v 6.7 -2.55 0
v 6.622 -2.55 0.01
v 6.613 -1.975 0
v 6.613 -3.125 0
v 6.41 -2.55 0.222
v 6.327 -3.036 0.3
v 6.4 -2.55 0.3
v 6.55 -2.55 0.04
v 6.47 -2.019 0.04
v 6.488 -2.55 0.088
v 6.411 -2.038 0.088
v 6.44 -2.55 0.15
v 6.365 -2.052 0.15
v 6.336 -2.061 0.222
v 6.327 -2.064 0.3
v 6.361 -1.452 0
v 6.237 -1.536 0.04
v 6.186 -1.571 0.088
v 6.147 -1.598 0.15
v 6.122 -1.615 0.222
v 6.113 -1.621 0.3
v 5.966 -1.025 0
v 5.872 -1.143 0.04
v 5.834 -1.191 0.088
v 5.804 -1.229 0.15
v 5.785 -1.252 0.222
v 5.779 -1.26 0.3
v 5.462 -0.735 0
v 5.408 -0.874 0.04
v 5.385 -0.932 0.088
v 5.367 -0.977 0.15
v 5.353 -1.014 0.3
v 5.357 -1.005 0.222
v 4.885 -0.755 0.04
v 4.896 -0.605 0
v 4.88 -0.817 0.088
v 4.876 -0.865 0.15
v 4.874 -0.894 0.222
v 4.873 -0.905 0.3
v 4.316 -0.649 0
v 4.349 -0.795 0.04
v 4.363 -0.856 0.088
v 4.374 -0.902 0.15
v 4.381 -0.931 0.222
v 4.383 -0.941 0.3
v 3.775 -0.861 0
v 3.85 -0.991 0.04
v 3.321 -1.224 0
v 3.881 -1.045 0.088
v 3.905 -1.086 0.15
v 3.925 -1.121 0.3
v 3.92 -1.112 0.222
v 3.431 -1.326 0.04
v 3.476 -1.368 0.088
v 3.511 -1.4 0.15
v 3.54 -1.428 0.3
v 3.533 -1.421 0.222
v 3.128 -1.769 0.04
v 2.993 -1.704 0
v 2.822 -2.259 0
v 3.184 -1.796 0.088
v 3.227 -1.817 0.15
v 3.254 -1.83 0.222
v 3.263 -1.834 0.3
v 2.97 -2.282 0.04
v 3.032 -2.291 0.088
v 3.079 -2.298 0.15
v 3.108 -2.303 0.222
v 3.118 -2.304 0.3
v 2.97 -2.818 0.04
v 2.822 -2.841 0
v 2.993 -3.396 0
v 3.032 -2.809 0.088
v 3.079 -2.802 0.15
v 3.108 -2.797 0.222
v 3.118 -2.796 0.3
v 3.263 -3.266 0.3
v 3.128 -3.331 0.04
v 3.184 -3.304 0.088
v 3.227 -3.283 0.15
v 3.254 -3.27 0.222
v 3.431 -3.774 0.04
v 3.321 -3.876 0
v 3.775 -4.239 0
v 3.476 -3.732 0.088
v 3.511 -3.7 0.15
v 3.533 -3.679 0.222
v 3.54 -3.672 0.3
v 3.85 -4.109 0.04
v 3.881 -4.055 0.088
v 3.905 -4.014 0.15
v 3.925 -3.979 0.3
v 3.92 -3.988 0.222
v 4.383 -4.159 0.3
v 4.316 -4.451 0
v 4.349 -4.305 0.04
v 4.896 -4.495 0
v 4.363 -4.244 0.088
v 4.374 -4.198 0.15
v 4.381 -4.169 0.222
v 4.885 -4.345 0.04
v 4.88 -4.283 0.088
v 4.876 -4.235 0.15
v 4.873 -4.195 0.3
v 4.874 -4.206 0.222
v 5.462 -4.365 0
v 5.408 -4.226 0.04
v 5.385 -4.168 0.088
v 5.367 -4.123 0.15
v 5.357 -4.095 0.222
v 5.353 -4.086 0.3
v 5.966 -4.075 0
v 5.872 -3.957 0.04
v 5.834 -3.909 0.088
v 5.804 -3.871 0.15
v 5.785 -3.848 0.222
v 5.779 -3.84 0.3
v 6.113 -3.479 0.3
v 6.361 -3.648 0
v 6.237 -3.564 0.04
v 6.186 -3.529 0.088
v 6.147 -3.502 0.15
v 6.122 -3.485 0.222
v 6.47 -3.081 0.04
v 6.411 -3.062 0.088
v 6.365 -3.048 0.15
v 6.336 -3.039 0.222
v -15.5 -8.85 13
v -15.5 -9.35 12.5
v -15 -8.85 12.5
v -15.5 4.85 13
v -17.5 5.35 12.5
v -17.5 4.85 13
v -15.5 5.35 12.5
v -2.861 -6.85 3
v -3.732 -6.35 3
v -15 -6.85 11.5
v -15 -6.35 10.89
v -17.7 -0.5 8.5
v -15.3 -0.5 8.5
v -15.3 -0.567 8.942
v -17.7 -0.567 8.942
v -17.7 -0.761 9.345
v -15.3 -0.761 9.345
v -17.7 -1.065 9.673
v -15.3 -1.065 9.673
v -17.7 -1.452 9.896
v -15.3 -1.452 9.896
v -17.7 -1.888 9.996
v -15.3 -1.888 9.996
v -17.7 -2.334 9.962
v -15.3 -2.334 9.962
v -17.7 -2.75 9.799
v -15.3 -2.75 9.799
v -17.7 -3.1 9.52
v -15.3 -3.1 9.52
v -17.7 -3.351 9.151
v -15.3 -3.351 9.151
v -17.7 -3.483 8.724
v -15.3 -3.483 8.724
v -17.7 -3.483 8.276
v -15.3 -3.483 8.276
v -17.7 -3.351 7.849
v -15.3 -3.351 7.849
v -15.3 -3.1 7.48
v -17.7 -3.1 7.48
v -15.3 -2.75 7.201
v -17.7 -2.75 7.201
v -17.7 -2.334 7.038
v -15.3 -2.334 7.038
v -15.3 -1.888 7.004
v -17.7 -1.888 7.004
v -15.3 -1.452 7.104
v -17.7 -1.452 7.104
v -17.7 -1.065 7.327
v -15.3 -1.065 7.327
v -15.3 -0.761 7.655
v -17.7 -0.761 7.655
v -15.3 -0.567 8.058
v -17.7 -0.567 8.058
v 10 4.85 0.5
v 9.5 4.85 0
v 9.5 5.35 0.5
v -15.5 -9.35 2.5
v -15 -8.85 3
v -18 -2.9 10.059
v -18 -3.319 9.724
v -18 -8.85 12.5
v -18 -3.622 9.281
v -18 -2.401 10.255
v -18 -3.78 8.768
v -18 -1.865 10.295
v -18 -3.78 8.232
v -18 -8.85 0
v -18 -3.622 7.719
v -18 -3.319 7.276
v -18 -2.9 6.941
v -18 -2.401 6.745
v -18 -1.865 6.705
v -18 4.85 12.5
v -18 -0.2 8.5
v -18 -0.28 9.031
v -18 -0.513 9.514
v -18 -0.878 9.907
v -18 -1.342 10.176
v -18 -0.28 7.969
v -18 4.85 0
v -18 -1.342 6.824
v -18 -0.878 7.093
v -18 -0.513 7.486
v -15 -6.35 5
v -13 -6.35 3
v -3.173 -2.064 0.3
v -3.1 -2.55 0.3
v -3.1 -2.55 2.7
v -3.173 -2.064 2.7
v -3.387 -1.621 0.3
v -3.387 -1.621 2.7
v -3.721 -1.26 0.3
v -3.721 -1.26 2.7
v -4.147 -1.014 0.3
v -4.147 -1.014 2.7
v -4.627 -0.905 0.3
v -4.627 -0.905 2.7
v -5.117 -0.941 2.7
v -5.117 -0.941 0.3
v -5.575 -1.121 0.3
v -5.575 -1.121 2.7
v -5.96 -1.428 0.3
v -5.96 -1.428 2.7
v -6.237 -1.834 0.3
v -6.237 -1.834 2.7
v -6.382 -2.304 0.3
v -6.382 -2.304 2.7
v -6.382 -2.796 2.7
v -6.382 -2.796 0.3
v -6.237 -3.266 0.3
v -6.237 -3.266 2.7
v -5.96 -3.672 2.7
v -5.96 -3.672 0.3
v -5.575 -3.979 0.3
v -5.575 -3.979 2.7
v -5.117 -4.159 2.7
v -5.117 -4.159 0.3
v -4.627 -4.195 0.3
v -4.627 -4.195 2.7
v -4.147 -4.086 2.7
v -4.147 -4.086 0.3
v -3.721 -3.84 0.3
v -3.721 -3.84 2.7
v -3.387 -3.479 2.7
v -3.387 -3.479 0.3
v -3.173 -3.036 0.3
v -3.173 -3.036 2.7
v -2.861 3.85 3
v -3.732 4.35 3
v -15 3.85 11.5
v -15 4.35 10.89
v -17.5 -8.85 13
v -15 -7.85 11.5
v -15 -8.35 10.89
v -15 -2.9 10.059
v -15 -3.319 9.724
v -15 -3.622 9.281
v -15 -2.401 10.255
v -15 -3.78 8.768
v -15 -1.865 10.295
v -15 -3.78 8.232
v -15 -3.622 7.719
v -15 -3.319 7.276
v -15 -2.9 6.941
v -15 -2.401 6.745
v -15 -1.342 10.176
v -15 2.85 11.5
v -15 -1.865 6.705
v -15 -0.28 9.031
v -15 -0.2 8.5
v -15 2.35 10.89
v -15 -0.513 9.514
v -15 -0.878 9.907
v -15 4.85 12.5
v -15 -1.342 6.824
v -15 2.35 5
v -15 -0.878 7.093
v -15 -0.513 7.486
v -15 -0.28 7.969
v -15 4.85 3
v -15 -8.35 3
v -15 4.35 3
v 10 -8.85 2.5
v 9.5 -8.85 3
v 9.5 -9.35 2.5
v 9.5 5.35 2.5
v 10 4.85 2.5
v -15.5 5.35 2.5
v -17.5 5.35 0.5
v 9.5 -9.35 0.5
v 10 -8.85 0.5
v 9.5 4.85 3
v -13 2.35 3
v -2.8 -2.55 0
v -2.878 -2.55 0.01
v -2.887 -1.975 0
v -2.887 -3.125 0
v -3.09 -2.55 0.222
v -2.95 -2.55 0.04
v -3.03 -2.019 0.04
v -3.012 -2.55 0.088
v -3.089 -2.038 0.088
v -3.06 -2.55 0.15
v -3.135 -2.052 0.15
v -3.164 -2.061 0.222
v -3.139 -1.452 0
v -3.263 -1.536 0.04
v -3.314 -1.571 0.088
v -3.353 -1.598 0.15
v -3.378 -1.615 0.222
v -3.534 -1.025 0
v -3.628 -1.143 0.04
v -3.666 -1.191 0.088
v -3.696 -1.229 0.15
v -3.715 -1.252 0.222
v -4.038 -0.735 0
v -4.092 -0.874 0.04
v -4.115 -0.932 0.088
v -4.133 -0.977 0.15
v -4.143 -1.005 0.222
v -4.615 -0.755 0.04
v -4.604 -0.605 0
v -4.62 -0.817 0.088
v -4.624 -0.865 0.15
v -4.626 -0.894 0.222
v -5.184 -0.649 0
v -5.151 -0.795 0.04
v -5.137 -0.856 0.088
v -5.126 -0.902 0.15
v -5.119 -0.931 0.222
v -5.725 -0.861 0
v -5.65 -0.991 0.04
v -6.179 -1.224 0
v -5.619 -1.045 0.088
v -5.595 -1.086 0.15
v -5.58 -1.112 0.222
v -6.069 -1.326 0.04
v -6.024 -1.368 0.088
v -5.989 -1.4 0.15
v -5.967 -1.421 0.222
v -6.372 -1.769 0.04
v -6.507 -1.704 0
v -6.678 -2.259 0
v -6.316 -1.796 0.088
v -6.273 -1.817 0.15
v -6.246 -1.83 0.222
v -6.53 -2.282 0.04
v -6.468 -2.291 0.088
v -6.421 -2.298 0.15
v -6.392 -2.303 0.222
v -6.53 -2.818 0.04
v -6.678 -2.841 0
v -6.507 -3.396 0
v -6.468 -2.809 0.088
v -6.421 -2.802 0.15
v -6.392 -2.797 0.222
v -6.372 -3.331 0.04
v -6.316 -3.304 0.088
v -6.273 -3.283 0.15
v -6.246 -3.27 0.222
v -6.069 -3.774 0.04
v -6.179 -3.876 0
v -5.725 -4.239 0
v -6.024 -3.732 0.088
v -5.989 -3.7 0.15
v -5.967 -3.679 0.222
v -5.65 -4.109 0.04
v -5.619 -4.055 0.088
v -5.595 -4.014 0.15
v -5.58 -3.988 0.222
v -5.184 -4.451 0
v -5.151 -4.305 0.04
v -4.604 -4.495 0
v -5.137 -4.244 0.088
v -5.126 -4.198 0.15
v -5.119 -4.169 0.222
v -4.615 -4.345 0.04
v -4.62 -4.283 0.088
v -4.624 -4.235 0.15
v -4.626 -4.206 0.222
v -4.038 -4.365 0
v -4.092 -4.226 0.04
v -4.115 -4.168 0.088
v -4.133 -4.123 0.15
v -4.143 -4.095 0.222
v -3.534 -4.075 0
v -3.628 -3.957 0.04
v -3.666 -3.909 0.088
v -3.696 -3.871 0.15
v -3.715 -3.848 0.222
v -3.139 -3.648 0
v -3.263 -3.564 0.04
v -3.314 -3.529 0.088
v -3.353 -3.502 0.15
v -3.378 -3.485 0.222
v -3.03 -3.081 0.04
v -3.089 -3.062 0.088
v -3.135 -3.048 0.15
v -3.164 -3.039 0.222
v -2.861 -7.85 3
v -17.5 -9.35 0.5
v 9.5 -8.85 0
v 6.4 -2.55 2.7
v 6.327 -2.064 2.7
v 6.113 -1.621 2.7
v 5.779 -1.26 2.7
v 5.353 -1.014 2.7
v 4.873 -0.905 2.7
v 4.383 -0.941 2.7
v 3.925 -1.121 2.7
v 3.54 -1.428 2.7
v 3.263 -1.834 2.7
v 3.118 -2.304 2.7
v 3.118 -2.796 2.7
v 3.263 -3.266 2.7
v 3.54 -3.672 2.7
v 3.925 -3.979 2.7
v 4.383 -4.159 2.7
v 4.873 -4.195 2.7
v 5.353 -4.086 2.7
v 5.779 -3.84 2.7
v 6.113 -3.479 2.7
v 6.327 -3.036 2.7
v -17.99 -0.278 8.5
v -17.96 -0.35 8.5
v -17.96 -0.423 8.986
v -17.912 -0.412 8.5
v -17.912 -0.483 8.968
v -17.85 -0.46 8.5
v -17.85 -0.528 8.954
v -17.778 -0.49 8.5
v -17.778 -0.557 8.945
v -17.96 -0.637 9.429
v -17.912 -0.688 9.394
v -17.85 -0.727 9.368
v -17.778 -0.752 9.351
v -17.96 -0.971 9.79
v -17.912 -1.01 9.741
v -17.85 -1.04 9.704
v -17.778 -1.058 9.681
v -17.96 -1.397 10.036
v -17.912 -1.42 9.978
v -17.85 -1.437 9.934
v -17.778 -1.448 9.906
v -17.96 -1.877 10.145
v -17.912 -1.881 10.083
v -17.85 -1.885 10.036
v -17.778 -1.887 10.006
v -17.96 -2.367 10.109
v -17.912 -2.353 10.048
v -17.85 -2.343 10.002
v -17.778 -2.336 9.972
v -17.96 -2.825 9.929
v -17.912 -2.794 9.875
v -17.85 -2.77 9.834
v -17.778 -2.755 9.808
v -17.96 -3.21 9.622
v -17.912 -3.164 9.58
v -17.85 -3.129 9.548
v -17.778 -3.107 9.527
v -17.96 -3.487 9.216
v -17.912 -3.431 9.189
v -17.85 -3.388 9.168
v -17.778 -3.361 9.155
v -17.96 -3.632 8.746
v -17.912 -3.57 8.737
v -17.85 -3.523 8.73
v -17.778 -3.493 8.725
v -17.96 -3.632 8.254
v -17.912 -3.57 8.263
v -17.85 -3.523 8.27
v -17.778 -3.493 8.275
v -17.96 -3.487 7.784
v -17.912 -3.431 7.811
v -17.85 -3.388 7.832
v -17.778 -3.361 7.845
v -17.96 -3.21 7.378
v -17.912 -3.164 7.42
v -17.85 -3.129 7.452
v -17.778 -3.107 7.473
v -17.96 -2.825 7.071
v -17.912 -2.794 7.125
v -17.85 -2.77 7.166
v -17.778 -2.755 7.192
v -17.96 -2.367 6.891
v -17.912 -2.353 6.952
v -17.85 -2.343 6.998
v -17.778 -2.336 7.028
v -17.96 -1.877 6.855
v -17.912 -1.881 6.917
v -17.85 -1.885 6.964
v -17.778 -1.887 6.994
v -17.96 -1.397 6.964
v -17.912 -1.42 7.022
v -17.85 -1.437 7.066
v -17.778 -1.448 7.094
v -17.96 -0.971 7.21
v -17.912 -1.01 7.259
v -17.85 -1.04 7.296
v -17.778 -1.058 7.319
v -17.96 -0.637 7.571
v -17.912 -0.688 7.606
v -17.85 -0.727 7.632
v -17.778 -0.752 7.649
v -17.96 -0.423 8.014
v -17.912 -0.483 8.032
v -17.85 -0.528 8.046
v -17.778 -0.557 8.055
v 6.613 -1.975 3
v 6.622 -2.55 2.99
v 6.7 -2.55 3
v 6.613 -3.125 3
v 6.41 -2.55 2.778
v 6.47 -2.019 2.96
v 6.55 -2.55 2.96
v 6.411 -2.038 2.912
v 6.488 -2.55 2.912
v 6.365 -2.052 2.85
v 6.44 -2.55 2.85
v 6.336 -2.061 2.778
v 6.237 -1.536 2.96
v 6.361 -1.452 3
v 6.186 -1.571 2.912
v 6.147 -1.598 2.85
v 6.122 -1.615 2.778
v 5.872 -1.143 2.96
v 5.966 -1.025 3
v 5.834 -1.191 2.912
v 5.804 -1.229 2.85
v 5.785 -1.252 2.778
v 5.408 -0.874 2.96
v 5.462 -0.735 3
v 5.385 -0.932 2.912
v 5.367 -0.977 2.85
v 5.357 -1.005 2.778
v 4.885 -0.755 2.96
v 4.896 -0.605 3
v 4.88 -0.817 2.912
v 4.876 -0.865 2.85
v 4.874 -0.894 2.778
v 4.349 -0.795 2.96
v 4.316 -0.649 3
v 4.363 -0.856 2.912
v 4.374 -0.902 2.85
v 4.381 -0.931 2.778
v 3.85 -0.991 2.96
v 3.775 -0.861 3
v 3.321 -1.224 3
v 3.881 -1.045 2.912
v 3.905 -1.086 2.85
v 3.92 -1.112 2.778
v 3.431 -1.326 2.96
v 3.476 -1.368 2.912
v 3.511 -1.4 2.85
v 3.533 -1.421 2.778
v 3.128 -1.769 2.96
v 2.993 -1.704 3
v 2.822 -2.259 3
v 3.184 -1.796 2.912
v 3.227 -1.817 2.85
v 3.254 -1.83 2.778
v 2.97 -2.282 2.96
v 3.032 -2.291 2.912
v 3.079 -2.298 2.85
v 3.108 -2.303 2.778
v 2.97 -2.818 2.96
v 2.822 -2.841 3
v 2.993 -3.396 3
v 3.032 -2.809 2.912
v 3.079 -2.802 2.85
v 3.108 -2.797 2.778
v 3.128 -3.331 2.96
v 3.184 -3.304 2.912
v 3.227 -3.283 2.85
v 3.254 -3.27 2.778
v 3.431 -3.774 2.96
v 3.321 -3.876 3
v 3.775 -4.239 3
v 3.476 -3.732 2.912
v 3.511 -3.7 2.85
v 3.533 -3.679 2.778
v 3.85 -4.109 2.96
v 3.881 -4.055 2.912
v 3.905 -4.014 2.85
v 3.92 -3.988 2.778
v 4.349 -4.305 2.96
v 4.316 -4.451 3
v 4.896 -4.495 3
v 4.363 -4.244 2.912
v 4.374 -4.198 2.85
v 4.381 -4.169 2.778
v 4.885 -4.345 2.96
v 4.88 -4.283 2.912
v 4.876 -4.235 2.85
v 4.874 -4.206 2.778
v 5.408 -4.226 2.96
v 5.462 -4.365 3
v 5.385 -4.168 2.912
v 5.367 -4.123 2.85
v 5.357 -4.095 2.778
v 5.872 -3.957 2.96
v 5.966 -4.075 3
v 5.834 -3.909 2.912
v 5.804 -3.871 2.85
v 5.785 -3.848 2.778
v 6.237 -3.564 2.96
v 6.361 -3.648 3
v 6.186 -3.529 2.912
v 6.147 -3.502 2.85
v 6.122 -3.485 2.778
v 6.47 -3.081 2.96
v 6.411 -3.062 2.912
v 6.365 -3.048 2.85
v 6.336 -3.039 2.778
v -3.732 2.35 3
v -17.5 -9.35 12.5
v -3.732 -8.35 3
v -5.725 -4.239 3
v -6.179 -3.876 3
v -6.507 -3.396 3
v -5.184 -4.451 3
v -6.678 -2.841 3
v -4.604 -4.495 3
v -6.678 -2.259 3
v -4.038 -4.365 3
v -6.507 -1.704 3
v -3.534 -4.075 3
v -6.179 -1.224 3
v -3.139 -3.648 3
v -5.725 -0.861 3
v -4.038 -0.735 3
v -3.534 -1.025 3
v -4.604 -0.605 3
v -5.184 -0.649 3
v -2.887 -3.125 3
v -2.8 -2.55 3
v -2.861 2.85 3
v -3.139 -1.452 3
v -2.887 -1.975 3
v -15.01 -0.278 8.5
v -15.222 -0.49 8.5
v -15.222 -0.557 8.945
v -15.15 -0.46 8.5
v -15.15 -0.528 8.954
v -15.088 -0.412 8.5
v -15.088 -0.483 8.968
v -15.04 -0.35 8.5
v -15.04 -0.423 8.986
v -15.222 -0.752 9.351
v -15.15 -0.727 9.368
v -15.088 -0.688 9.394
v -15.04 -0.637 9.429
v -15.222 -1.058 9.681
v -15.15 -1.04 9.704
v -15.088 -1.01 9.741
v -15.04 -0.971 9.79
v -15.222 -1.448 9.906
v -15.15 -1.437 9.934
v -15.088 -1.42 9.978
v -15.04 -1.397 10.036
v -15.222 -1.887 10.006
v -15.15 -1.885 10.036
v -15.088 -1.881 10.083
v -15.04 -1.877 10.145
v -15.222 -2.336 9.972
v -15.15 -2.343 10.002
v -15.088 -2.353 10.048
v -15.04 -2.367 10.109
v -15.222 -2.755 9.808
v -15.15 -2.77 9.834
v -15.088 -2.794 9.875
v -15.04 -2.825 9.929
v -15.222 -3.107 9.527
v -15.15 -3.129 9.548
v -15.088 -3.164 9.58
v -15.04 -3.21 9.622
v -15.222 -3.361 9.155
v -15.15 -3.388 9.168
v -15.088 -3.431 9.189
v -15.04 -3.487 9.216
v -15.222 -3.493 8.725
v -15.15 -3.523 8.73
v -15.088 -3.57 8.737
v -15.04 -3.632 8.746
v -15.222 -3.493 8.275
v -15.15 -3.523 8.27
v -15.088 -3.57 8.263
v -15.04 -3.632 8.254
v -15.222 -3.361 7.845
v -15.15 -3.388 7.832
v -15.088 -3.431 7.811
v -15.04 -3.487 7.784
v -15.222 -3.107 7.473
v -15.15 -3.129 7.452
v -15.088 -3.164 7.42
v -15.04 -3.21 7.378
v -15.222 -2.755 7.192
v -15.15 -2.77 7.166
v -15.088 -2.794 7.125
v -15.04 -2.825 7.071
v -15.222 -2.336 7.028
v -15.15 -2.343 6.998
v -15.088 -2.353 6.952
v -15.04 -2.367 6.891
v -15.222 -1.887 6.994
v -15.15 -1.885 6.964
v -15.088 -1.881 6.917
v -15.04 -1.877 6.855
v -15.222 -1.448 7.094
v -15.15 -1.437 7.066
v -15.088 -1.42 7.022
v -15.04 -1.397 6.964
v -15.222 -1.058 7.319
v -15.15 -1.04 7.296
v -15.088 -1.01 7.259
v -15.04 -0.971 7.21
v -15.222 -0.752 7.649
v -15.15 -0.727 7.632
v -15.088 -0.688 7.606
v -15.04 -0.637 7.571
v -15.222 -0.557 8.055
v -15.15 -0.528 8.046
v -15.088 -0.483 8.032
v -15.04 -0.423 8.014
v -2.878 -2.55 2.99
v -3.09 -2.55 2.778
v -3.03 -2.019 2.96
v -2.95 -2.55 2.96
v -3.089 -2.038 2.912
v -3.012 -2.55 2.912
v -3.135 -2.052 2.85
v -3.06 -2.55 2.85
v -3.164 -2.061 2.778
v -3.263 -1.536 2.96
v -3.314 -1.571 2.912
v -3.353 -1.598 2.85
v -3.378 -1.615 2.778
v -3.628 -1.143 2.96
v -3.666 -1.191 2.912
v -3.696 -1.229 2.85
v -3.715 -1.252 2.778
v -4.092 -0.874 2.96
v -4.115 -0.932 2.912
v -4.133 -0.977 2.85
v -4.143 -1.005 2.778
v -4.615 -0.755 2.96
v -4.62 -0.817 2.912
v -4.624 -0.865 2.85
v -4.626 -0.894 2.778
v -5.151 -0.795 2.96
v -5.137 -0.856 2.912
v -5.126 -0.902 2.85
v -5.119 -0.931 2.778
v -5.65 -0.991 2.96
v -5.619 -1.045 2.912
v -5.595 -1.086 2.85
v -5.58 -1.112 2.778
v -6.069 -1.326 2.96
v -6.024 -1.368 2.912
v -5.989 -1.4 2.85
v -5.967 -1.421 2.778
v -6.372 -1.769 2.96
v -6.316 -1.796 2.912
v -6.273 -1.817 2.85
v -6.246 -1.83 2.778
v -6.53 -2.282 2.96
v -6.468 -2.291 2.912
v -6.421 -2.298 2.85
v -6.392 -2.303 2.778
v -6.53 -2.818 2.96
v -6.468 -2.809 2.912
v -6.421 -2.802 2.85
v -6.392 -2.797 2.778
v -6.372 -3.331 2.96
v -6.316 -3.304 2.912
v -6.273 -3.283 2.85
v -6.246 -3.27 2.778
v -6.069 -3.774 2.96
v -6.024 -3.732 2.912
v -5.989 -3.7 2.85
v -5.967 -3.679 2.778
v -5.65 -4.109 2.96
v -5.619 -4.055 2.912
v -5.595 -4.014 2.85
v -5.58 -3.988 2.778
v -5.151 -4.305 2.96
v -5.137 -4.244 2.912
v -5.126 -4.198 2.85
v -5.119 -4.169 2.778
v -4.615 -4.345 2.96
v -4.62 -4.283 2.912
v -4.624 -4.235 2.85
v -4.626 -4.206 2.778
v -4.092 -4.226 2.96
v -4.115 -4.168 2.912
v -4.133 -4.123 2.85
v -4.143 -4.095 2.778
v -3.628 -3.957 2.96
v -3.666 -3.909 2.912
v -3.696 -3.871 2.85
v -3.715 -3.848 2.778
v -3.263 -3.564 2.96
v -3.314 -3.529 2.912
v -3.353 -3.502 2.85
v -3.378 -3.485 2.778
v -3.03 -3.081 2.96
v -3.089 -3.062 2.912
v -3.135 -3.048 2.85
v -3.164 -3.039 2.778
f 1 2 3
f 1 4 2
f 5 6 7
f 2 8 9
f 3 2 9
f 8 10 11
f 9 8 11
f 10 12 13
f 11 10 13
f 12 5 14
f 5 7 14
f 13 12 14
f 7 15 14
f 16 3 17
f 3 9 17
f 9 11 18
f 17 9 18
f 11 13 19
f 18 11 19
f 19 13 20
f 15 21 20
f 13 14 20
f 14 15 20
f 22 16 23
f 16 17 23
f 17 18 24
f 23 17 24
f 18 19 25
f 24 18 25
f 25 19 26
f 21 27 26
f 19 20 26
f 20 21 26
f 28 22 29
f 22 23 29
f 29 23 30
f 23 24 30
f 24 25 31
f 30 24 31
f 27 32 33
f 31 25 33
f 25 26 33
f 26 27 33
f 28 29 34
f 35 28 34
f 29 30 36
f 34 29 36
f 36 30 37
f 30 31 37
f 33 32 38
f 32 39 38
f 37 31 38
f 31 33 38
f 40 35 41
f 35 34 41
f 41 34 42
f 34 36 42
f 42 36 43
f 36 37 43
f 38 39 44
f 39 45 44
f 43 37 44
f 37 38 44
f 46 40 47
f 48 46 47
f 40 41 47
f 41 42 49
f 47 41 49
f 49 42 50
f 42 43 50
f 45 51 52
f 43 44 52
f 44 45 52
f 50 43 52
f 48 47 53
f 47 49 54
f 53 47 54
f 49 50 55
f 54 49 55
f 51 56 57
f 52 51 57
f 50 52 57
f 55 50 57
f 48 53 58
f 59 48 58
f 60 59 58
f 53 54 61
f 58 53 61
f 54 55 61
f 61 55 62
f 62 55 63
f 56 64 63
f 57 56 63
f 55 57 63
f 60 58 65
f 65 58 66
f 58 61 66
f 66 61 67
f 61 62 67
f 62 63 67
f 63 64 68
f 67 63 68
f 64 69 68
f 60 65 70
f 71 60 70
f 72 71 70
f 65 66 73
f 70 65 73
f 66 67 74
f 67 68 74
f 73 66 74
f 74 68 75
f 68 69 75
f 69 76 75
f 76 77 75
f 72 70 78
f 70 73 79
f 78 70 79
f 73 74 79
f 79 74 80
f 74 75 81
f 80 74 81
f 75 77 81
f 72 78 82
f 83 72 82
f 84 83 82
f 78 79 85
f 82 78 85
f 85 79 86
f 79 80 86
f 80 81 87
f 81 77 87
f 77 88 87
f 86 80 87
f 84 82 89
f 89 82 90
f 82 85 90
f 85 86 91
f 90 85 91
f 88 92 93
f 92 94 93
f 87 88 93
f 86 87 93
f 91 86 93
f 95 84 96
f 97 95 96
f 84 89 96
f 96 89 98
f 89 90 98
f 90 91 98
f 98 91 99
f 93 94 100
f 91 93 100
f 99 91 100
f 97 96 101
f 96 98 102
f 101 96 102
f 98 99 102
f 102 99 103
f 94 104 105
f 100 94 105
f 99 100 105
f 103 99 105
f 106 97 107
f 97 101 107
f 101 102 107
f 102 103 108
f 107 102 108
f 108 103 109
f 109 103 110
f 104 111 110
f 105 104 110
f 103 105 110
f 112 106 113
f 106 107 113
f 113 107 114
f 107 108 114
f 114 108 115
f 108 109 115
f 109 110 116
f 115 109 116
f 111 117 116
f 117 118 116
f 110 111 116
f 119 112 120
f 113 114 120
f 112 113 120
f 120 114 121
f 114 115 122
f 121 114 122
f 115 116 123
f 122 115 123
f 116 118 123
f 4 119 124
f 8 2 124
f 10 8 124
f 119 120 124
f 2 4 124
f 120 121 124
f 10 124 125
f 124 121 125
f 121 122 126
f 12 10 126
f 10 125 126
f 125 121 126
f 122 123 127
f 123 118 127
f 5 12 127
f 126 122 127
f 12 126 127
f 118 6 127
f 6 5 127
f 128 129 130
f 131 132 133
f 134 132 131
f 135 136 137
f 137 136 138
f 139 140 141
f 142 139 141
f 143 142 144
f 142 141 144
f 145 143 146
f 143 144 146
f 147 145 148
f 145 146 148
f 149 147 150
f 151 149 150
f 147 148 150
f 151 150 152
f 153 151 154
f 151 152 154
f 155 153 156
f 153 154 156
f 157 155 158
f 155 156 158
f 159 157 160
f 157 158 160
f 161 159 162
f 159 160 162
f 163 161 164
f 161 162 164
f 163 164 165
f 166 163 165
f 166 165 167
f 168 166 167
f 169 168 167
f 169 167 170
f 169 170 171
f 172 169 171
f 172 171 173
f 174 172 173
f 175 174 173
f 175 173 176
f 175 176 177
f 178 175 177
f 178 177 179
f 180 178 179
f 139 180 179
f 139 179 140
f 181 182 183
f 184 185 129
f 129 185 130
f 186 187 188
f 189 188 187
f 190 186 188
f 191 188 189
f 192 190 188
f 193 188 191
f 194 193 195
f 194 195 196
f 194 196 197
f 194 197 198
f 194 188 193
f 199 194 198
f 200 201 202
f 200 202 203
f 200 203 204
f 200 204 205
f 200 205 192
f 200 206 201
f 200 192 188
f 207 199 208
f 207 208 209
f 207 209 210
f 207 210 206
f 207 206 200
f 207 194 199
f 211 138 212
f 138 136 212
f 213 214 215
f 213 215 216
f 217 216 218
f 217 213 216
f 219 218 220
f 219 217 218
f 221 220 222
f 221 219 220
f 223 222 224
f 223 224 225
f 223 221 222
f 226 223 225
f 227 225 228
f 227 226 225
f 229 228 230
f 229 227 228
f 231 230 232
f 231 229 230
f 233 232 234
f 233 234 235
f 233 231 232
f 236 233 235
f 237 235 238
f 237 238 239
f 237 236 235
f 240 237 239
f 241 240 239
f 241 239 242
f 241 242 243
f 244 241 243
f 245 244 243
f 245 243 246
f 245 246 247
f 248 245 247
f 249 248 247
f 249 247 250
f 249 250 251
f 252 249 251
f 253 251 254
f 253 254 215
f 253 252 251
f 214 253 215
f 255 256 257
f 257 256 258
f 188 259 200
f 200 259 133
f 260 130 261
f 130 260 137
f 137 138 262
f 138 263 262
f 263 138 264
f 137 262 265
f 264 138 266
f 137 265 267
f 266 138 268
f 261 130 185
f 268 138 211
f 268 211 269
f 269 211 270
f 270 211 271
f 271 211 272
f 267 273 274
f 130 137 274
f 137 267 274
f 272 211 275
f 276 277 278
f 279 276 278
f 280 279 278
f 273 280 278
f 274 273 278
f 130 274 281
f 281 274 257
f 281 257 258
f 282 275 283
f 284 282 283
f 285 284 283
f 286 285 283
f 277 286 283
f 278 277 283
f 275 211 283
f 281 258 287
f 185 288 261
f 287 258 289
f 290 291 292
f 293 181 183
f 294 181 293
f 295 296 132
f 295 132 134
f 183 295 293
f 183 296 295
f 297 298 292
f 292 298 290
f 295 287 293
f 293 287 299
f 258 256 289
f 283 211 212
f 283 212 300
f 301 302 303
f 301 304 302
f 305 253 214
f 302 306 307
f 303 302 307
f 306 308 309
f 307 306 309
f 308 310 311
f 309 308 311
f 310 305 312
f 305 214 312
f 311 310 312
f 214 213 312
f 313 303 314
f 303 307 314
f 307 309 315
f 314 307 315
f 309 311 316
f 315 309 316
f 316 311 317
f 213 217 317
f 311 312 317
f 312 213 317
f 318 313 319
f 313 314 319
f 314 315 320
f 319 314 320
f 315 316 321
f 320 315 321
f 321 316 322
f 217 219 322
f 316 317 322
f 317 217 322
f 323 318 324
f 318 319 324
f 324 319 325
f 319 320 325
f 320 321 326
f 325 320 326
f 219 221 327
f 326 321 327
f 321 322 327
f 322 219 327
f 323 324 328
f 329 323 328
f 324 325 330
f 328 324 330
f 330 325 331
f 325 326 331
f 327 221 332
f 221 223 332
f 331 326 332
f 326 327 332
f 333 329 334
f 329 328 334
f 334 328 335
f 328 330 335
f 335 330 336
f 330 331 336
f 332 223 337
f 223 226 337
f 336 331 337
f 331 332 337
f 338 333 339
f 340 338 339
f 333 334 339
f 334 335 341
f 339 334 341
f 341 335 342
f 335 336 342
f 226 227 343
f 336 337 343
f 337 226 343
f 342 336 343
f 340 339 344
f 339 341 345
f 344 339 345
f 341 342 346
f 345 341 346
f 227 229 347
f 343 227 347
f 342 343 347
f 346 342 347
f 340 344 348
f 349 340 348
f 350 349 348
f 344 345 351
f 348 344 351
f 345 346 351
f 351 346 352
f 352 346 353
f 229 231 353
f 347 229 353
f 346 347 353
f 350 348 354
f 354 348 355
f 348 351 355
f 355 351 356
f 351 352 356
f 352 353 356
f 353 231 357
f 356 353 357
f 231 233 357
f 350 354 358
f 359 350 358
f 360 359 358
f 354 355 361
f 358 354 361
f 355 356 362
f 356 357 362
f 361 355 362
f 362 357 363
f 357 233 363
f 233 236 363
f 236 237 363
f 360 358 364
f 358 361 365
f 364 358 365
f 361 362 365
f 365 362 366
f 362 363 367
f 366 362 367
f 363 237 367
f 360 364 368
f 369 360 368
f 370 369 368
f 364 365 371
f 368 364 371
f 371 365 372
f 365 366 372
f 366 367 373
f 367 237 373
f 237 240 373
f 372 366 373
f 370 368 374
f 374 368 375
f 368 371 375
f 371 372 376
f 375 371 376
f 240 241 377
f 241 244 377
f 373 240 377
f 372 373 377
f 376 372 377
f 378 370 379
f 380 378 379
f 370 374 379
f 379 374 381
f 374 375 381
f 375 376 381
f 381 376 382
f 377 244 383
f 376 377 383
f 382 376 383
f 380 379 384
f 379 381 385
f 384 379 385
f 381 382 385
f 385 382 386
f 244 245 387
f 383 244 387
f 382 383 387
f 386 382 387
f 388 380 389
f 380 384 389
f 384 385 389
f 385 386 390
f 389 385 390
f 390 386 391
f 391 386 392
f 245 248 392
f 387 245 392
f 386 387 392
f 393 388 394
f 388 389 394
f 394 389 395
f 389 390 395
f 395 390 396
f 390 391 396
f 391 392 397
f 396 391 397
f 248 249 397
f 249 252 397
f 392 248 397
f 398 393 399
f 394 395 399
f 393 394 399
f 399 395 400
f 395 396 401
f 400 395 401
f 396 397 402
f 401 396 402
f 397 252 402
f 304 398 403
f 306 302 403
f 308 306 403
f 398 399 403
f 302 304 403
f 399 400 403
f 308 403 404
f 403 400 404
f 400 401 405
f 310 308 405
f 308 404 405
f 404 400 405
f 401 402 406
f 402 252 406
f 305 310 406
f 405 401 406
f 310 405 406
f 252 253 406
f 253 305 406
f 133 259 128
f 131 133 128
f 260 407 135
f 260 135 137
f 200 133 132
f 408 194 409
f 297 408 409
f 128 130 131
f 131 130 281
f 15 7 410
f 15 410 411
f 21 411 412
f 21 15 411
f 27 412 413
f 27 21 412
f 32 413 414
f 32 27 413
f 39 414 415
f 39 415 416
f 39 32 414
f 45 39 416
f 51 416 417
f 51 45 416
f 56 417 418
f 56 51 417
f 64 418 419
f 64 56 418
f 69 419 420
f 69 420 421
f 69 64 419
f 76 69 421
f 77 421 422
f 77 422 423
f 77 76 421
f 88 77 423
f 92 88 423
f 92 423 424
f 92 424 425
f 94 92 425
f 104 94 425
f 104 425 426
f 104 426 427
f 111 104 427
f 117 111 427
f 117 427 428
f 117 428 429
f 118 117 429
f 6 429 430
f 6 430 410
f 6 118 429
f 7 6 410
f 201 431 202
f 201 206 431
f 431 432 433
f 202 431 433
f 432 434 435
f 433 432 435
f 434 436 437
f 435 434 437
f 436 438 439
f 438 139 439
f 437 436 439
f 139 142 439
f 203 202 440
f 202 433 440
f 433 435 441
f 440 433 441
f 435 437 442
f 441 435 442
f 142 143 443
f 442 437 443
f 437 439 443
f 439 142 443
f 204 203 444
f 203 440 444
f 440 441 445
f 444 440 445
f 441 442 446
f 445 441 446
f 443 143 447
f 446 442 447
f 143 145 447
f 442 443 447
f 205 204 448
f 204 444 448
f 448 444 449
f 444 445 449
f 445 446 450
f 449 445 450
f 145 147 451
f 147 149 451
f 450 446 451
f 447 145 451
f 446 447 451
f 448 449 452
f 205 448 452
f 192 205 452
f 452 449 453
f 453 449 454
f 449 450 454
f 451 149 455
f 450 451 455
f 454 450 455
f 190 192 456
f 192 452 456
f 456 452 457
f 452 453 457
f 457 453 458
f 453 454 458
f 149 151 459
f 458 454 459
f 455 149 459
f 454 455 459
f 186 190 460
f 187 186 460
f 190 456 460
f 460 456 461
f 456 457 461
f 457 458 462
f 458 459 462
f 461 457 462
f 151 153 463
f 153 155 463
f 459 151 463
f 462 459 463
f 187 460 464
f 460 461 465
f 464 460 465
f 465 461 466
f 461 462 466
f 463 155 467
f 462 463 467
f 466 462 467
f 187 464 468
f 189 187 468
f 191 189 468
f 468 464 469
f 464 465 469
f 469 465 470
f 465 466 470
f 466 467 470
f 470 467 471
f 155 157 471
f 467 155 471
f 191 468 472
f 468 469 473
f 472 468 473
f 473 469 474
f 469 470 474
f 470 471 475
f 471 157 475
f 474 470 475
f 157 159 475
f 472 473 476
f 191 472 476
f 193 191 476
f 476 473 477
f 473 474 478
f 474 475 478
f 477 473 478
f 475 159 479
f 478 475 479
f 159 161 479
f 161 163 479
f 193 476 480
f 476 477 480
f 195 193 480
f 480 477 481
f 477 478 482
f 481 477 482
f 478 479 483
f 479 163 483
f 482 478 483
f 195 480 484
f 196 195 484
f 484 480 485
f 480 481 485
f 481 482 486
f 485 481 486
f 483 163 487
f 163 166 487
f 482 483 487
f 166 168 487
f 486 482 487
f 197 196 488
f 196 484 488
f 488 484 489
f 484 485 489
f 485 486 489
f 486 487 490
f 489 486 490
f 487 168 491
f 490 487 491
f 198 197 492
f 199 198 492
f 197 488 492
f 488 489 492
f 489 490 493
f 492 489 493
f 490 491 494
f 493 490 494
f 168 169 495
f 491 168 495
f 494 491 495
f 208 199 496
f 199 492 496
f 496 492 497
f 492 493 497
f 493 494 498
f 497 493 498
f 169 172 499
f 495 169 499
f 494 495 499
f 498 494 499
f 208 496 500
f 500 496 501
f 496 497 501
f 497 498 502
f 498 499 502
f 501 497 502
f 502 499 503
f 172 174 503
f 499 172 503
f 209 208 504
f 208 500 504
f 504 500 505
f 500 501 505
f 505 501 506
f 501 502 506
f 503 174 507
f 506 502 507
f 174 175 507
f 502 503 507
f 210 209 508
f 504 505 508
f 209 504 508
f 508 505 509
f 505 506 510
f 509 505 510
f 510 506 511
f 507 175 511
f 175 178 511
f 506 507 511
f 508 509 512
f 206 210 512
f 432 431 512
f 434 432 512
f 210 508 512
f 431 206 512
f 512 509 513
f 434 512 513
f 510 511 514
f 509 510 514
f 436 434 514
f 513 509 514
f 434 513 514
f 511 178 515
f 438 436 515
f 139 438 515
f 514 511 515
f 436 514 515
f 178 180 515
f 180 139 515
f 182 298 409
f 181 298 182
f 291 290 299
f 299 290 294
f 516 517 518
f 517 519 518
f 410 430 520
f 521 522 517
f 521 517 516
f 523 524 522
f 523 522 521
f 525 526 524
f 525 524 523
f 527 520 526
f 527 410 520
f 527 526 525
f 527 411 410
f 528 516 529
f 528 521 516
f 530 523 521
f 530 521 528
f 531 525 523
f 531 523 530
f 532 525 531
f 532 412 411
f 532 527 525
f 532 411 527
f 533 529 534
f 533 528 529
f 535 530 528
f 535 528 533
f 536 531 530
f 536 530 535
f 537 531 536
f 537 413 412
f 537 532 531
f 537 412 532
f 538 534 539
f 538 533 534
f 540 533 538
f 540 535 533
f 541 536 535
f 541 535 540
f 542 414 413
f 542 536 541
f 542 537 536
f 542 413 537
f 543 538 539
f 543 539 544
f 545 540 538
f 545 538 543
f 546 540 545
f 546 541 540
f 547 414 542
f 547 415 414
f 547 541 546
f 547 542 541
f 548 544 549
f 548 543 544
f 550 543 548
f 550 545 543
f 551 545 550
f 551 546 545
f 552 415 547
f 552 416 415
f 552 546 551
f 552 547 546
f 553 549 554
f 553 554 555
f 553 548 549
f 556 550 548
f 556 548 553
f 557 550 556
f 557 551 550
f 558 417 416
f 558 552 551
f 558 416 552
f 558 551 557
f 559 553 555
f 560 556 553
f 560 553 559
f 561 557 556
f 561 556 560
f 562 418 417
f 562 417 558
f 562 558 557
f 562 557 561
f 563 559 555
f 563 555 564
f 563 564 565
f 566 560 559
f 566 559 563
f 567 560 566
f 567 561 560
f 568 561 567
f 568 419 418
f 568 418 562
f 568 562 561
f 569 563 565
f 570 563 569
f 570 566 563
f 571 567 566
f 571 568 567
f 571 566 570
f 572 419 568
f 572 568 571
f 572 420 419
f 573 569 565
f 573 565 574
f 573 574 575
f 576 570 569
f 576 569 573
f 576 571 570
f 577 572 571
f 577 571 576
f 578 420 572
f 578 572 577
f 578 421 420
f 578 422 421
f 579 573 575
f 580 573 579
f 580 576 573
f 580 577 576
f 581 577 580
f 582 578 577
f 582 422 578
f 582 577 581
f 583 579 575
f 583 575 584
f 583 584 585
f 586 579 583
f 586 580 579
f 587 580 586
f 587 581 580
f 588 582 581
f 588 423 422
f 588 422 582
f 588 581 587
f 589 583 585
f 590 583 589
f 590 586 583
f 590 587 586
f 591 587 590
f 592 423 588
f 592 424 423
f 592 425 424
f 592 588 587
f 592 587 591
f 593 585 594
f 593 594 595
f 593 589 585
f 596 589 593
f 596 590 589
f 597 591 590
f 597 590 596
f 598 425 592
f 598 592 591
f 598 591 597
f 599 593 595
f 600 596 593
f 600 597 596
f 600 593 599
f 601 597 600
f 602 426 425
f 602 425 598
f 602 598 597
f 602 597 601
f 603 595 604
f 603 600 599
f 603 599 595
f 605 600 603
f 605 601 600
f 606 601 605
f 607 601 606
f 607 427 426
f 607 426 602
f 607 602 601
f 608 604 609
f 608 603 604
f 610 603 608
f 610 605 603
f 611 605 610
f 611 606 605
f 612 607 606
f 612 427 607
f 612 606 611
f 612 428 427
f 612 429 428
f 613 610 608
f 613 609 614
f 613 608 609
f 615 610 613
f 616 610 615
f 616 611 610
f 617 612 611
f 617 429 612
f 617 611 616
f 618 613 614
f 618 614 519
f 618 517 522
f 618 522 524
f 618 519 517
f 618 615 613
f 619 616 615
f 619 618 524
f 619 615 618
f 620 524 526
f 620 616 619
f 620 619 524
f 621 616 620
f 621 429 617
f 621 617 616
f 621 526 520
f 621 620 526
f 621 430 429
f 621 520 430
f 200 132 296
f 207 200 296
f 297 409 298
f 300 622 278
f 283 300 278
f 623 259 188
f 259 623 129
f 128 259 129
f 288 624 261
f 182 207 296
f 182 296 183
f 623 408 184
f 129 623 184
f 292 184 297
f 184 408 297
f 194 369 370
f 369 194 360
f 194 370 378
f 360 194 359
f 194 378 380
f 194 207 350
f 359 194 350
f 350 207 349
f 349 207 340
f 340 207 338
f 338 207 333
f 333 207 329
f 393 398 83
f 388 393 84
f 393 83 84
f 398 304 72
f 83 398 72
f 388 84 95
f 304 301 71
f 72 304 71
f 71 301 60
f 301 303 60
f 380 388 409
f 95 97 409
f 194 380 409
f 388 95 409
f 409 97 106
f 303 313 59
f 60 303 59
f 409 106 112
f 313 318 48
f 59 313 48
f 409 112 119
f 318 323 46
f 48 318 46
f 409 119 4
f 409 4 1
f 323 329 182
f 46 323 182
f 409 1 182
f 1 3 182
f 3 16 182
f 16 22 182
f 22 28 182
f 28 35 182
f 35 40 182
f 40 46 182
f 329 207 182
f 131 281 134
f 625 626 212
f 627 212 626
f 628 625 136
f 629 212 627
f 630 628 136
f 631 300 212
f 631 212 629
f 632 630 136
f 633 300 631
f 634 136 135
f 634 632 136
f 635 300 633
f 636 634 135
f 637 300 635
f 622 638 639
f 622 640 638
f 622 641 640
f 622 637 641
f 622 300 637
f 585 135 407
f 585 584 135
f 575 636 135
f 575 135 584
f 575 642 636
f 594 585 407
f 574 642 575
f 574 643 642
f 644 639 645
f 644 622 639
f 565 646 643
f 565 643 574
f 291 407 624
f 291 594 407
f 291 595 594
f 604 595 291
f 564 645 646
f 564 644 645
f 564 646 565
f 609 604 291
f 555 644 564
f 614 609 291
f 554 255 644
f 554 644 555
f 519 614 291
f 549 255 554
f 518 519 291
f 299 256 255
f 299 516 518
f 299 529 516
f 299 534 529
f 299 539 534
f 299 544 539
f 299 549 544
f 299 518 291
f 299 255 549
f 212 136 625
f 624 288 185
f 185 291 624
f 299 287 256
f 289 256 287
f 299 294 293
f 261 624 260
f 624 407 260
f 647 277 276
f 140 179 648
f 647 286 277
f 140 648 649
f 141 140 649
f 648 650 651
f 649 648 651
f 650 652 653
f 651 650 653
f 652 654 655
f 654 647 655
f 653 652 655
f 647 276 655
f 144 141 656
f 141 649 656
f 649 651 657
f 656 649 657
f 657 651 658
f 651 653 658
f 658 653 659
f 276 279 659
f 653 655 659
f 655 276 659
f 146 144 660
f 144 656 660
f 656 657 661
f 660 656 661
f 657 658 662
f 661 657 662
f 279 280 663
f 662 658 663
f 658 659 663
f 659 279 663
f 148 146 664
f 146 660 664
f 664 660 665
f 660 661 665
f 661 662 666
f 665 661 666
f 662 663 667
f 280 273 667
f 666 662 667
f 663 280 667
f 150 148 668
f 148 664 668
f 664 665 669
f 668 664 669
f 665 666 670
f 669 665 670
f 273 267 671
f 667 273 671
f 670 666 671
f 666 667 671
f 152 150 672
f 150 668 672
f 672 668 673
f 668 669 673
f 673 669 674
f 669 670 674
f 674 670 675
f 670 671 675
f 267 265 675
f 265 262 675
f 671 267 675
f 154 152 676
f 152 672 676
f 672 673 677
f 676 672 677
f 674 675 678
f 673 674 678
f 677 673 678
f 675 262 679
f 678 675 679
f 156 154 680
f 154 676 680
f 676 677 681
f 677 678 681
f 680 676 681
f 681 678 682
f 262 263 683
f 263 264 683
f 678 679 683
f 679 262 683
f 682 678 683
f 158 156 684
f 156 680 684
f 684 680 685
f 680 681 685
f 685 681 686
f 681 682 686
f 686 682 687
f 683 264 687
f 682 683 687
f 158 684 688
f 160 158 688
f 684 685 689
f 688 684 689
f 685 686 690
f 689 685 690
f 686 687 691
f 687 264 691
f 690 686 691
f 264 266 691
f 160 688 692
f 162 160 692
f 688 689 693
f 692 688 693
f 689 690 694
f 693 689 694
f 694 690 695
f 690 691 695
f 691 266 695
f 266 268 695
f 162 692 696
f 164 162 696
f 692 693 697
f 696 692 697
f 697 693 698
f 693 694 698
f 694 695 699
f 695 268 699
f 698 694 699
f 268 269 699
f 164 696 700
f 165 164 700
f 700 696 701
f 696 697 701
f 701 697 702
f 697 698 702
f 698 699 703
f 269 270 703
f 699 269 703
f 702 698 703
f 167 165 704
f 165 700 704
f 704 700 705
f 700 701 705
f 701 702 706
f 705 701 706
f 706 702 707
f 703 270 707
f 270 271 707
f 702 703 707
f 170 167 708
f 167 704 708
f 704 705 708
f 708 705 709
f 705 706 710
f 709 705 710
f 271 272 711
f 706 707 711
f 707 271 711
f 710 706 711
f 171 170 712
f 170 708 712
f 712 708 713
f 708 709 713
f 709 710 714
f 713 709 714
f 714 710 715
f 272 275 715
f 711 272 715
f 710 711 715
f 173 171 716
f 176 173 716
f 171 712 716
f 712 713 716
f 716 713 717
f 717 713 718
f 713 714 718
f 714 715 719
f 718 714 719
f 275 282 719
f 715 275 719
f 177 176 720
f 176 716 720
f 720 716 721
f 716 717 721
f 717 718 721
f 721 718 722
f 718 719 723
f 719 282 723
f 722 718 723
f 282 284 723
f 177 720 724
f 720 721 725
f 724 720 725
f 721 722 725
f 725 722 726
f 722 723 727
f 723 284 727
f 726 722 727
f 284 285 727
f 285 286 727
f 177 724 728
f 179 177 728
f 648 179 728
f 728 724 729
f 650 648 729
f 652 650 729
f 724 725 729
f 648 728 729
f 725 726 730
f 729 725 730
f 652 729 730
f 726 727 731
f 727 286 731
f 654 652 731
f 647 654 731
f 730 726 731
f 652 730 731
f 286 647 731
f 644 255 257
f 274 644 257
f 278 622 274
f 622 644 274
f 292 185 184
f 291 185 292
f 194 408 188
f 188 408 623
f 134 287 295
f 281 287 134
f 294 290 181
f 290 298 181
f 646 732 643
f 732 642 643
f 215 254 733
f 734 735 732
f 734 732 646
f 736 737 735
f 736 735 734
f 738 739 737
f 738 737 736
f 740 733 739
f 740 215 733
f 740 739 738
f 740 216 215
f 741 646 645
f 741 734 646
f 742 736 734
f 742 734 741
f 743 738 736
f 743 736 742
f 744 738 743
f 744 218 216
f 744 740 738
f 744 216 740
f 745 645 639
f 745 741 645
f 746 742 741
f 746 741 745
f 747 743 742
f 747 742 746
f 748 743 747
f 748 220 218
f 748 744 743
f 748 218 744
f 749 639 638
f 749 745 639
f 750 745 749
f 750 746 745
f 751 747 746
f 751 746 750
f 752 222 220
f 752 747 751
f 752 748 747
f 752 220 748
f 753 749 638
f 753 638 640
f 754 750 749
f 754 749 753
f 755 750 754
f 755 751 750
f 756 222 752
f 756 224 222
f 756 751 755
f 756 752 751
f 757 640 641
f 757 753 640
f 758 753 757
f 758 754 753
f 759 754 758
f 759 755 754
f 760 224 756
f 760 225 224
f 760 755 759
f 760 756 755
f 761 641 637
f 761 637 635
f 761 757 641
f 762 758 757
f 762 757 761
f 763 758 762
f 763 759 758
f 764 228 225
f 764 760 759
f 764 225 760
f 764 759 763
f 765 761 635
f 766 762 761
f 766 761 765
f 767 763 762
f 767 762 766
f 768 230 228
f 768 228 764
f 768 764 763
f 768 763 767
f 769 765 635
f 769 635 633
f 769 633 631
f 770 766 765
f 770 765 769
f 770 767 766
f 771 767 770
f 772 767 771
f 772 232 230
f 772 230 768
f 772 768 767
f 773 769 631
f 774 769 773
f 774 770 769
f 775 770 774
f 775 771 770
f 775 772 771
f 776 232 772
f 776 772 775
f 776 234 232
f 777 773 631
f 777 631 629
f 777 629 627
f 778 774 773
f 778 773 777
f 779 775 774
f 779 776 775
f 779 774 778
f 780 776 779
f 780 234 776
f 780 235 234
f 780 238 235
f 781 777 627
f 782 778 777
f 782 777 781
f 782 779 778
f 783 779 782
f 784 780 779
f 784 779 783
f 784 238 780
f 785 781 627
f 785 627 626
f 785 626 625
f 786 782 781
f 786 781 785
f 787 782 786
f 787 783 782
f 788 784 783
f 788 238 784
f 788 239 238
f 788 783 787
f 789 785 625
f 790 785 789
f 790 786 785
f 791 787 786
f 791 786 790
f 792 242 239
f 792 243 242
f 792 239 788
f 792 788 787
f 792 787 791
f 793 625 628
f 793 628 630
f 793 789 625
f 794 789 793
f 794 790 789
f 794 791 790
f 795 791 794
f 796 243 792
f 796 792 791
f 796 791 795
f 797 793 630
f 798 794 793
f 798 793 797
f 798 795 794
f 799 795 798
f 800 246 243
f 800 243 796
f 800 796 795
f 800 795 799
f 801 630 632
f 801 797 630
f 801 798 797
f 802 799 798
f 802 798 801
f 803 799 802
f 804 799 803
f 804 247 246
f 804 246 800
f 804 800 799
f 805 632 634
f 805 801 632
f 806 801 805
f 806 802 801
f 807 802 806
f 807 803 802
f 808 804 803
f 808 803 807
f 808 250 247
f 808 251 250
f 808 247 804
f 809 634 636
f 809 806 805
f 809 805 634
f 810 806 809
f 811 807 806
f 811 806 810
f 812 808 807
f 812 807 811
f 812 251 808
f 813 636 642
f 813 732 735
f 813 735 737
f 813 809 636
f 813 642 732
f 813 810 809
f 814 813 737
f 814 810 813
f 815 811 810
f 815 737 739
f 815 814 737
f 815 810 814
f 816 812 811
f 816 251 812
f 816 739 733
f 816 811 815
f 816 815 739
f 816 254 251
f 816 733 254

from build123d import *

# Parameters (mm, degrees)
ESBO_O2_W                = 28
ESBO_O2_H                = 14.7
ESBO_O2_R                = 1.65
RESSALTO_EXTRUS_O1_DEPTH = 3
ESBO_O3_W                = 3
ESBO_O3_H                = 14.7
RESSALTO_EXTRUS_O2_DEPTH = 10
ESBO_O4_R                = 1.5
CORTE_EXTRUS_O1_DEPTH    = 10
FILETE1_R                = 0.3
RESSALTO_EXTRUS_O3_DEPTH = 2
RESSALTO_EXTRUS_O4_DEPTH = 2
CHANFRO4_SIZE            = 0.5
CHANFRO6_SIZE            = 2


with BuildPart() as part:
    # Esboço2 → Ressalto-extrusão1 (new body)
    with BuildSketch(Plane.XY):
        with Locations((-4, -2)):
            Rectangle(ESBO_O2_W, ESBO_O2_H)
        with Locations((-4.75, -2.55)):
            Circle(ESBO_O2_R, mode=Mode.SUBTRACT)
        with Locations((4.75, -2.55)):
            Circle(ESBO_O2_R, mode=Mode.SUBTRACT)
    extrude(amount=RESSALTO_EXTRUS_O1_DEPTH)

    # Esboço3 → Ressalto-extrusão2 (add)
    with BuildSketch(Plane.XY.offset(3)):
        with Locations((-16.5, -2)):
            Rectangle(ESBO_O3_W, ESBO_O3_H)
    extrude(amount=RESSALTO_EXTRUS_O2_DEPTH)

    # Esboço4 → Corte-extrusão1 (cut)
    with BuildSketch(Plane(origin=(-15, 0, 0), x_dir=(0, 0, -1), z_dir=(1, 0, 0))):
        with Locations(Location((-8.5, -2, 0), (0, 0, 90))):
            Circle(ESBO_O4_R)
    extrude(amount=-CORTE_EXTRUS_O1_DEPTH, mode=Mode.SUBTRACT)

    # Filete1
    filete1_edges = [part.edges().sort_by_distance(p)[0] for p in [
        (-6.4, -2.55, 0),
        (-6.4, -2.55, 3),
        (3.1, -2.55, 0),
        (3.1, -2.55, 3),
        (-18, -3.5, 8.5),
        (-15, -3.5, 8.5),
    ]]
    fillet(filete1_edges, radius=FILETE1_R)

    # Esboço5 → Ressalto-extrusão3 (add)
    with BuildSketch(Plane(origin=(0, 4.35, 0), x_dir=(1, 0, 0), z_dir=(0, 1, 0))):
        Polygon((-15, -3), (-2.860741943, -3), (-15, -11.5), align=None)
    extrude(amount=-RESSALTO_EXTRUS_O3_DEPTH)

    # Esboço7 → Ressalto-extrusão4 (add)
    with BuildSketch(Plane(origin=(0, -8.35, 0), x_dir=(-1, 0, 0), z_dir=(0, -1, 0))):
        Polygon((15, -11.5), (15, -3), (2.860741943, -3), align=None)
    extrude(amount=-RESSALTO_EXTRUS_O4_DEPTH)

    # Chanfro4
    chanfro4_edges = [part.edges().sort_by_distance(p)[0] for p in [
        (-2.5, -9.35, 3),
        (-15, -9.35, 8),
        (-15, 5.35, 8),
        (-18, -2, 13),
        (-16.5, -9.35, 13),
        (-15, -2, 13),
        (-16.5, 5.35, 13),
        (10, -2, 3),
        (-4, -9.35, 0),
        (-4, 5.35, 0),
        (10, -2, 0),
        (-8.930370971, 2.35, 7.25),
        (-8.930370971, 4.35, 7.25),
        (-8.930370971, -6.35, 7.25),
        (-8.930370971, -8.35, 7.25),
        (10, -9.35, 1.5),
        (-18, -9.35, 6.5),
        (-18, 5.35, 6.5),
        (10, 5.35, 1.5),
        (-2.5, 5.35, 3),
    ]]
    chamfer(chanfro4_edges, length=CHANFRO4_SIZE)

    # Chanfro6
    chanfro6_edges = [part.edges().sort_by_distance(p)[0] for p in [
        (-15, -2, 3),
    ]]
    chamfer(chanfro6_edges, length=CHANFRO6_SIZE)


solid = part.part
